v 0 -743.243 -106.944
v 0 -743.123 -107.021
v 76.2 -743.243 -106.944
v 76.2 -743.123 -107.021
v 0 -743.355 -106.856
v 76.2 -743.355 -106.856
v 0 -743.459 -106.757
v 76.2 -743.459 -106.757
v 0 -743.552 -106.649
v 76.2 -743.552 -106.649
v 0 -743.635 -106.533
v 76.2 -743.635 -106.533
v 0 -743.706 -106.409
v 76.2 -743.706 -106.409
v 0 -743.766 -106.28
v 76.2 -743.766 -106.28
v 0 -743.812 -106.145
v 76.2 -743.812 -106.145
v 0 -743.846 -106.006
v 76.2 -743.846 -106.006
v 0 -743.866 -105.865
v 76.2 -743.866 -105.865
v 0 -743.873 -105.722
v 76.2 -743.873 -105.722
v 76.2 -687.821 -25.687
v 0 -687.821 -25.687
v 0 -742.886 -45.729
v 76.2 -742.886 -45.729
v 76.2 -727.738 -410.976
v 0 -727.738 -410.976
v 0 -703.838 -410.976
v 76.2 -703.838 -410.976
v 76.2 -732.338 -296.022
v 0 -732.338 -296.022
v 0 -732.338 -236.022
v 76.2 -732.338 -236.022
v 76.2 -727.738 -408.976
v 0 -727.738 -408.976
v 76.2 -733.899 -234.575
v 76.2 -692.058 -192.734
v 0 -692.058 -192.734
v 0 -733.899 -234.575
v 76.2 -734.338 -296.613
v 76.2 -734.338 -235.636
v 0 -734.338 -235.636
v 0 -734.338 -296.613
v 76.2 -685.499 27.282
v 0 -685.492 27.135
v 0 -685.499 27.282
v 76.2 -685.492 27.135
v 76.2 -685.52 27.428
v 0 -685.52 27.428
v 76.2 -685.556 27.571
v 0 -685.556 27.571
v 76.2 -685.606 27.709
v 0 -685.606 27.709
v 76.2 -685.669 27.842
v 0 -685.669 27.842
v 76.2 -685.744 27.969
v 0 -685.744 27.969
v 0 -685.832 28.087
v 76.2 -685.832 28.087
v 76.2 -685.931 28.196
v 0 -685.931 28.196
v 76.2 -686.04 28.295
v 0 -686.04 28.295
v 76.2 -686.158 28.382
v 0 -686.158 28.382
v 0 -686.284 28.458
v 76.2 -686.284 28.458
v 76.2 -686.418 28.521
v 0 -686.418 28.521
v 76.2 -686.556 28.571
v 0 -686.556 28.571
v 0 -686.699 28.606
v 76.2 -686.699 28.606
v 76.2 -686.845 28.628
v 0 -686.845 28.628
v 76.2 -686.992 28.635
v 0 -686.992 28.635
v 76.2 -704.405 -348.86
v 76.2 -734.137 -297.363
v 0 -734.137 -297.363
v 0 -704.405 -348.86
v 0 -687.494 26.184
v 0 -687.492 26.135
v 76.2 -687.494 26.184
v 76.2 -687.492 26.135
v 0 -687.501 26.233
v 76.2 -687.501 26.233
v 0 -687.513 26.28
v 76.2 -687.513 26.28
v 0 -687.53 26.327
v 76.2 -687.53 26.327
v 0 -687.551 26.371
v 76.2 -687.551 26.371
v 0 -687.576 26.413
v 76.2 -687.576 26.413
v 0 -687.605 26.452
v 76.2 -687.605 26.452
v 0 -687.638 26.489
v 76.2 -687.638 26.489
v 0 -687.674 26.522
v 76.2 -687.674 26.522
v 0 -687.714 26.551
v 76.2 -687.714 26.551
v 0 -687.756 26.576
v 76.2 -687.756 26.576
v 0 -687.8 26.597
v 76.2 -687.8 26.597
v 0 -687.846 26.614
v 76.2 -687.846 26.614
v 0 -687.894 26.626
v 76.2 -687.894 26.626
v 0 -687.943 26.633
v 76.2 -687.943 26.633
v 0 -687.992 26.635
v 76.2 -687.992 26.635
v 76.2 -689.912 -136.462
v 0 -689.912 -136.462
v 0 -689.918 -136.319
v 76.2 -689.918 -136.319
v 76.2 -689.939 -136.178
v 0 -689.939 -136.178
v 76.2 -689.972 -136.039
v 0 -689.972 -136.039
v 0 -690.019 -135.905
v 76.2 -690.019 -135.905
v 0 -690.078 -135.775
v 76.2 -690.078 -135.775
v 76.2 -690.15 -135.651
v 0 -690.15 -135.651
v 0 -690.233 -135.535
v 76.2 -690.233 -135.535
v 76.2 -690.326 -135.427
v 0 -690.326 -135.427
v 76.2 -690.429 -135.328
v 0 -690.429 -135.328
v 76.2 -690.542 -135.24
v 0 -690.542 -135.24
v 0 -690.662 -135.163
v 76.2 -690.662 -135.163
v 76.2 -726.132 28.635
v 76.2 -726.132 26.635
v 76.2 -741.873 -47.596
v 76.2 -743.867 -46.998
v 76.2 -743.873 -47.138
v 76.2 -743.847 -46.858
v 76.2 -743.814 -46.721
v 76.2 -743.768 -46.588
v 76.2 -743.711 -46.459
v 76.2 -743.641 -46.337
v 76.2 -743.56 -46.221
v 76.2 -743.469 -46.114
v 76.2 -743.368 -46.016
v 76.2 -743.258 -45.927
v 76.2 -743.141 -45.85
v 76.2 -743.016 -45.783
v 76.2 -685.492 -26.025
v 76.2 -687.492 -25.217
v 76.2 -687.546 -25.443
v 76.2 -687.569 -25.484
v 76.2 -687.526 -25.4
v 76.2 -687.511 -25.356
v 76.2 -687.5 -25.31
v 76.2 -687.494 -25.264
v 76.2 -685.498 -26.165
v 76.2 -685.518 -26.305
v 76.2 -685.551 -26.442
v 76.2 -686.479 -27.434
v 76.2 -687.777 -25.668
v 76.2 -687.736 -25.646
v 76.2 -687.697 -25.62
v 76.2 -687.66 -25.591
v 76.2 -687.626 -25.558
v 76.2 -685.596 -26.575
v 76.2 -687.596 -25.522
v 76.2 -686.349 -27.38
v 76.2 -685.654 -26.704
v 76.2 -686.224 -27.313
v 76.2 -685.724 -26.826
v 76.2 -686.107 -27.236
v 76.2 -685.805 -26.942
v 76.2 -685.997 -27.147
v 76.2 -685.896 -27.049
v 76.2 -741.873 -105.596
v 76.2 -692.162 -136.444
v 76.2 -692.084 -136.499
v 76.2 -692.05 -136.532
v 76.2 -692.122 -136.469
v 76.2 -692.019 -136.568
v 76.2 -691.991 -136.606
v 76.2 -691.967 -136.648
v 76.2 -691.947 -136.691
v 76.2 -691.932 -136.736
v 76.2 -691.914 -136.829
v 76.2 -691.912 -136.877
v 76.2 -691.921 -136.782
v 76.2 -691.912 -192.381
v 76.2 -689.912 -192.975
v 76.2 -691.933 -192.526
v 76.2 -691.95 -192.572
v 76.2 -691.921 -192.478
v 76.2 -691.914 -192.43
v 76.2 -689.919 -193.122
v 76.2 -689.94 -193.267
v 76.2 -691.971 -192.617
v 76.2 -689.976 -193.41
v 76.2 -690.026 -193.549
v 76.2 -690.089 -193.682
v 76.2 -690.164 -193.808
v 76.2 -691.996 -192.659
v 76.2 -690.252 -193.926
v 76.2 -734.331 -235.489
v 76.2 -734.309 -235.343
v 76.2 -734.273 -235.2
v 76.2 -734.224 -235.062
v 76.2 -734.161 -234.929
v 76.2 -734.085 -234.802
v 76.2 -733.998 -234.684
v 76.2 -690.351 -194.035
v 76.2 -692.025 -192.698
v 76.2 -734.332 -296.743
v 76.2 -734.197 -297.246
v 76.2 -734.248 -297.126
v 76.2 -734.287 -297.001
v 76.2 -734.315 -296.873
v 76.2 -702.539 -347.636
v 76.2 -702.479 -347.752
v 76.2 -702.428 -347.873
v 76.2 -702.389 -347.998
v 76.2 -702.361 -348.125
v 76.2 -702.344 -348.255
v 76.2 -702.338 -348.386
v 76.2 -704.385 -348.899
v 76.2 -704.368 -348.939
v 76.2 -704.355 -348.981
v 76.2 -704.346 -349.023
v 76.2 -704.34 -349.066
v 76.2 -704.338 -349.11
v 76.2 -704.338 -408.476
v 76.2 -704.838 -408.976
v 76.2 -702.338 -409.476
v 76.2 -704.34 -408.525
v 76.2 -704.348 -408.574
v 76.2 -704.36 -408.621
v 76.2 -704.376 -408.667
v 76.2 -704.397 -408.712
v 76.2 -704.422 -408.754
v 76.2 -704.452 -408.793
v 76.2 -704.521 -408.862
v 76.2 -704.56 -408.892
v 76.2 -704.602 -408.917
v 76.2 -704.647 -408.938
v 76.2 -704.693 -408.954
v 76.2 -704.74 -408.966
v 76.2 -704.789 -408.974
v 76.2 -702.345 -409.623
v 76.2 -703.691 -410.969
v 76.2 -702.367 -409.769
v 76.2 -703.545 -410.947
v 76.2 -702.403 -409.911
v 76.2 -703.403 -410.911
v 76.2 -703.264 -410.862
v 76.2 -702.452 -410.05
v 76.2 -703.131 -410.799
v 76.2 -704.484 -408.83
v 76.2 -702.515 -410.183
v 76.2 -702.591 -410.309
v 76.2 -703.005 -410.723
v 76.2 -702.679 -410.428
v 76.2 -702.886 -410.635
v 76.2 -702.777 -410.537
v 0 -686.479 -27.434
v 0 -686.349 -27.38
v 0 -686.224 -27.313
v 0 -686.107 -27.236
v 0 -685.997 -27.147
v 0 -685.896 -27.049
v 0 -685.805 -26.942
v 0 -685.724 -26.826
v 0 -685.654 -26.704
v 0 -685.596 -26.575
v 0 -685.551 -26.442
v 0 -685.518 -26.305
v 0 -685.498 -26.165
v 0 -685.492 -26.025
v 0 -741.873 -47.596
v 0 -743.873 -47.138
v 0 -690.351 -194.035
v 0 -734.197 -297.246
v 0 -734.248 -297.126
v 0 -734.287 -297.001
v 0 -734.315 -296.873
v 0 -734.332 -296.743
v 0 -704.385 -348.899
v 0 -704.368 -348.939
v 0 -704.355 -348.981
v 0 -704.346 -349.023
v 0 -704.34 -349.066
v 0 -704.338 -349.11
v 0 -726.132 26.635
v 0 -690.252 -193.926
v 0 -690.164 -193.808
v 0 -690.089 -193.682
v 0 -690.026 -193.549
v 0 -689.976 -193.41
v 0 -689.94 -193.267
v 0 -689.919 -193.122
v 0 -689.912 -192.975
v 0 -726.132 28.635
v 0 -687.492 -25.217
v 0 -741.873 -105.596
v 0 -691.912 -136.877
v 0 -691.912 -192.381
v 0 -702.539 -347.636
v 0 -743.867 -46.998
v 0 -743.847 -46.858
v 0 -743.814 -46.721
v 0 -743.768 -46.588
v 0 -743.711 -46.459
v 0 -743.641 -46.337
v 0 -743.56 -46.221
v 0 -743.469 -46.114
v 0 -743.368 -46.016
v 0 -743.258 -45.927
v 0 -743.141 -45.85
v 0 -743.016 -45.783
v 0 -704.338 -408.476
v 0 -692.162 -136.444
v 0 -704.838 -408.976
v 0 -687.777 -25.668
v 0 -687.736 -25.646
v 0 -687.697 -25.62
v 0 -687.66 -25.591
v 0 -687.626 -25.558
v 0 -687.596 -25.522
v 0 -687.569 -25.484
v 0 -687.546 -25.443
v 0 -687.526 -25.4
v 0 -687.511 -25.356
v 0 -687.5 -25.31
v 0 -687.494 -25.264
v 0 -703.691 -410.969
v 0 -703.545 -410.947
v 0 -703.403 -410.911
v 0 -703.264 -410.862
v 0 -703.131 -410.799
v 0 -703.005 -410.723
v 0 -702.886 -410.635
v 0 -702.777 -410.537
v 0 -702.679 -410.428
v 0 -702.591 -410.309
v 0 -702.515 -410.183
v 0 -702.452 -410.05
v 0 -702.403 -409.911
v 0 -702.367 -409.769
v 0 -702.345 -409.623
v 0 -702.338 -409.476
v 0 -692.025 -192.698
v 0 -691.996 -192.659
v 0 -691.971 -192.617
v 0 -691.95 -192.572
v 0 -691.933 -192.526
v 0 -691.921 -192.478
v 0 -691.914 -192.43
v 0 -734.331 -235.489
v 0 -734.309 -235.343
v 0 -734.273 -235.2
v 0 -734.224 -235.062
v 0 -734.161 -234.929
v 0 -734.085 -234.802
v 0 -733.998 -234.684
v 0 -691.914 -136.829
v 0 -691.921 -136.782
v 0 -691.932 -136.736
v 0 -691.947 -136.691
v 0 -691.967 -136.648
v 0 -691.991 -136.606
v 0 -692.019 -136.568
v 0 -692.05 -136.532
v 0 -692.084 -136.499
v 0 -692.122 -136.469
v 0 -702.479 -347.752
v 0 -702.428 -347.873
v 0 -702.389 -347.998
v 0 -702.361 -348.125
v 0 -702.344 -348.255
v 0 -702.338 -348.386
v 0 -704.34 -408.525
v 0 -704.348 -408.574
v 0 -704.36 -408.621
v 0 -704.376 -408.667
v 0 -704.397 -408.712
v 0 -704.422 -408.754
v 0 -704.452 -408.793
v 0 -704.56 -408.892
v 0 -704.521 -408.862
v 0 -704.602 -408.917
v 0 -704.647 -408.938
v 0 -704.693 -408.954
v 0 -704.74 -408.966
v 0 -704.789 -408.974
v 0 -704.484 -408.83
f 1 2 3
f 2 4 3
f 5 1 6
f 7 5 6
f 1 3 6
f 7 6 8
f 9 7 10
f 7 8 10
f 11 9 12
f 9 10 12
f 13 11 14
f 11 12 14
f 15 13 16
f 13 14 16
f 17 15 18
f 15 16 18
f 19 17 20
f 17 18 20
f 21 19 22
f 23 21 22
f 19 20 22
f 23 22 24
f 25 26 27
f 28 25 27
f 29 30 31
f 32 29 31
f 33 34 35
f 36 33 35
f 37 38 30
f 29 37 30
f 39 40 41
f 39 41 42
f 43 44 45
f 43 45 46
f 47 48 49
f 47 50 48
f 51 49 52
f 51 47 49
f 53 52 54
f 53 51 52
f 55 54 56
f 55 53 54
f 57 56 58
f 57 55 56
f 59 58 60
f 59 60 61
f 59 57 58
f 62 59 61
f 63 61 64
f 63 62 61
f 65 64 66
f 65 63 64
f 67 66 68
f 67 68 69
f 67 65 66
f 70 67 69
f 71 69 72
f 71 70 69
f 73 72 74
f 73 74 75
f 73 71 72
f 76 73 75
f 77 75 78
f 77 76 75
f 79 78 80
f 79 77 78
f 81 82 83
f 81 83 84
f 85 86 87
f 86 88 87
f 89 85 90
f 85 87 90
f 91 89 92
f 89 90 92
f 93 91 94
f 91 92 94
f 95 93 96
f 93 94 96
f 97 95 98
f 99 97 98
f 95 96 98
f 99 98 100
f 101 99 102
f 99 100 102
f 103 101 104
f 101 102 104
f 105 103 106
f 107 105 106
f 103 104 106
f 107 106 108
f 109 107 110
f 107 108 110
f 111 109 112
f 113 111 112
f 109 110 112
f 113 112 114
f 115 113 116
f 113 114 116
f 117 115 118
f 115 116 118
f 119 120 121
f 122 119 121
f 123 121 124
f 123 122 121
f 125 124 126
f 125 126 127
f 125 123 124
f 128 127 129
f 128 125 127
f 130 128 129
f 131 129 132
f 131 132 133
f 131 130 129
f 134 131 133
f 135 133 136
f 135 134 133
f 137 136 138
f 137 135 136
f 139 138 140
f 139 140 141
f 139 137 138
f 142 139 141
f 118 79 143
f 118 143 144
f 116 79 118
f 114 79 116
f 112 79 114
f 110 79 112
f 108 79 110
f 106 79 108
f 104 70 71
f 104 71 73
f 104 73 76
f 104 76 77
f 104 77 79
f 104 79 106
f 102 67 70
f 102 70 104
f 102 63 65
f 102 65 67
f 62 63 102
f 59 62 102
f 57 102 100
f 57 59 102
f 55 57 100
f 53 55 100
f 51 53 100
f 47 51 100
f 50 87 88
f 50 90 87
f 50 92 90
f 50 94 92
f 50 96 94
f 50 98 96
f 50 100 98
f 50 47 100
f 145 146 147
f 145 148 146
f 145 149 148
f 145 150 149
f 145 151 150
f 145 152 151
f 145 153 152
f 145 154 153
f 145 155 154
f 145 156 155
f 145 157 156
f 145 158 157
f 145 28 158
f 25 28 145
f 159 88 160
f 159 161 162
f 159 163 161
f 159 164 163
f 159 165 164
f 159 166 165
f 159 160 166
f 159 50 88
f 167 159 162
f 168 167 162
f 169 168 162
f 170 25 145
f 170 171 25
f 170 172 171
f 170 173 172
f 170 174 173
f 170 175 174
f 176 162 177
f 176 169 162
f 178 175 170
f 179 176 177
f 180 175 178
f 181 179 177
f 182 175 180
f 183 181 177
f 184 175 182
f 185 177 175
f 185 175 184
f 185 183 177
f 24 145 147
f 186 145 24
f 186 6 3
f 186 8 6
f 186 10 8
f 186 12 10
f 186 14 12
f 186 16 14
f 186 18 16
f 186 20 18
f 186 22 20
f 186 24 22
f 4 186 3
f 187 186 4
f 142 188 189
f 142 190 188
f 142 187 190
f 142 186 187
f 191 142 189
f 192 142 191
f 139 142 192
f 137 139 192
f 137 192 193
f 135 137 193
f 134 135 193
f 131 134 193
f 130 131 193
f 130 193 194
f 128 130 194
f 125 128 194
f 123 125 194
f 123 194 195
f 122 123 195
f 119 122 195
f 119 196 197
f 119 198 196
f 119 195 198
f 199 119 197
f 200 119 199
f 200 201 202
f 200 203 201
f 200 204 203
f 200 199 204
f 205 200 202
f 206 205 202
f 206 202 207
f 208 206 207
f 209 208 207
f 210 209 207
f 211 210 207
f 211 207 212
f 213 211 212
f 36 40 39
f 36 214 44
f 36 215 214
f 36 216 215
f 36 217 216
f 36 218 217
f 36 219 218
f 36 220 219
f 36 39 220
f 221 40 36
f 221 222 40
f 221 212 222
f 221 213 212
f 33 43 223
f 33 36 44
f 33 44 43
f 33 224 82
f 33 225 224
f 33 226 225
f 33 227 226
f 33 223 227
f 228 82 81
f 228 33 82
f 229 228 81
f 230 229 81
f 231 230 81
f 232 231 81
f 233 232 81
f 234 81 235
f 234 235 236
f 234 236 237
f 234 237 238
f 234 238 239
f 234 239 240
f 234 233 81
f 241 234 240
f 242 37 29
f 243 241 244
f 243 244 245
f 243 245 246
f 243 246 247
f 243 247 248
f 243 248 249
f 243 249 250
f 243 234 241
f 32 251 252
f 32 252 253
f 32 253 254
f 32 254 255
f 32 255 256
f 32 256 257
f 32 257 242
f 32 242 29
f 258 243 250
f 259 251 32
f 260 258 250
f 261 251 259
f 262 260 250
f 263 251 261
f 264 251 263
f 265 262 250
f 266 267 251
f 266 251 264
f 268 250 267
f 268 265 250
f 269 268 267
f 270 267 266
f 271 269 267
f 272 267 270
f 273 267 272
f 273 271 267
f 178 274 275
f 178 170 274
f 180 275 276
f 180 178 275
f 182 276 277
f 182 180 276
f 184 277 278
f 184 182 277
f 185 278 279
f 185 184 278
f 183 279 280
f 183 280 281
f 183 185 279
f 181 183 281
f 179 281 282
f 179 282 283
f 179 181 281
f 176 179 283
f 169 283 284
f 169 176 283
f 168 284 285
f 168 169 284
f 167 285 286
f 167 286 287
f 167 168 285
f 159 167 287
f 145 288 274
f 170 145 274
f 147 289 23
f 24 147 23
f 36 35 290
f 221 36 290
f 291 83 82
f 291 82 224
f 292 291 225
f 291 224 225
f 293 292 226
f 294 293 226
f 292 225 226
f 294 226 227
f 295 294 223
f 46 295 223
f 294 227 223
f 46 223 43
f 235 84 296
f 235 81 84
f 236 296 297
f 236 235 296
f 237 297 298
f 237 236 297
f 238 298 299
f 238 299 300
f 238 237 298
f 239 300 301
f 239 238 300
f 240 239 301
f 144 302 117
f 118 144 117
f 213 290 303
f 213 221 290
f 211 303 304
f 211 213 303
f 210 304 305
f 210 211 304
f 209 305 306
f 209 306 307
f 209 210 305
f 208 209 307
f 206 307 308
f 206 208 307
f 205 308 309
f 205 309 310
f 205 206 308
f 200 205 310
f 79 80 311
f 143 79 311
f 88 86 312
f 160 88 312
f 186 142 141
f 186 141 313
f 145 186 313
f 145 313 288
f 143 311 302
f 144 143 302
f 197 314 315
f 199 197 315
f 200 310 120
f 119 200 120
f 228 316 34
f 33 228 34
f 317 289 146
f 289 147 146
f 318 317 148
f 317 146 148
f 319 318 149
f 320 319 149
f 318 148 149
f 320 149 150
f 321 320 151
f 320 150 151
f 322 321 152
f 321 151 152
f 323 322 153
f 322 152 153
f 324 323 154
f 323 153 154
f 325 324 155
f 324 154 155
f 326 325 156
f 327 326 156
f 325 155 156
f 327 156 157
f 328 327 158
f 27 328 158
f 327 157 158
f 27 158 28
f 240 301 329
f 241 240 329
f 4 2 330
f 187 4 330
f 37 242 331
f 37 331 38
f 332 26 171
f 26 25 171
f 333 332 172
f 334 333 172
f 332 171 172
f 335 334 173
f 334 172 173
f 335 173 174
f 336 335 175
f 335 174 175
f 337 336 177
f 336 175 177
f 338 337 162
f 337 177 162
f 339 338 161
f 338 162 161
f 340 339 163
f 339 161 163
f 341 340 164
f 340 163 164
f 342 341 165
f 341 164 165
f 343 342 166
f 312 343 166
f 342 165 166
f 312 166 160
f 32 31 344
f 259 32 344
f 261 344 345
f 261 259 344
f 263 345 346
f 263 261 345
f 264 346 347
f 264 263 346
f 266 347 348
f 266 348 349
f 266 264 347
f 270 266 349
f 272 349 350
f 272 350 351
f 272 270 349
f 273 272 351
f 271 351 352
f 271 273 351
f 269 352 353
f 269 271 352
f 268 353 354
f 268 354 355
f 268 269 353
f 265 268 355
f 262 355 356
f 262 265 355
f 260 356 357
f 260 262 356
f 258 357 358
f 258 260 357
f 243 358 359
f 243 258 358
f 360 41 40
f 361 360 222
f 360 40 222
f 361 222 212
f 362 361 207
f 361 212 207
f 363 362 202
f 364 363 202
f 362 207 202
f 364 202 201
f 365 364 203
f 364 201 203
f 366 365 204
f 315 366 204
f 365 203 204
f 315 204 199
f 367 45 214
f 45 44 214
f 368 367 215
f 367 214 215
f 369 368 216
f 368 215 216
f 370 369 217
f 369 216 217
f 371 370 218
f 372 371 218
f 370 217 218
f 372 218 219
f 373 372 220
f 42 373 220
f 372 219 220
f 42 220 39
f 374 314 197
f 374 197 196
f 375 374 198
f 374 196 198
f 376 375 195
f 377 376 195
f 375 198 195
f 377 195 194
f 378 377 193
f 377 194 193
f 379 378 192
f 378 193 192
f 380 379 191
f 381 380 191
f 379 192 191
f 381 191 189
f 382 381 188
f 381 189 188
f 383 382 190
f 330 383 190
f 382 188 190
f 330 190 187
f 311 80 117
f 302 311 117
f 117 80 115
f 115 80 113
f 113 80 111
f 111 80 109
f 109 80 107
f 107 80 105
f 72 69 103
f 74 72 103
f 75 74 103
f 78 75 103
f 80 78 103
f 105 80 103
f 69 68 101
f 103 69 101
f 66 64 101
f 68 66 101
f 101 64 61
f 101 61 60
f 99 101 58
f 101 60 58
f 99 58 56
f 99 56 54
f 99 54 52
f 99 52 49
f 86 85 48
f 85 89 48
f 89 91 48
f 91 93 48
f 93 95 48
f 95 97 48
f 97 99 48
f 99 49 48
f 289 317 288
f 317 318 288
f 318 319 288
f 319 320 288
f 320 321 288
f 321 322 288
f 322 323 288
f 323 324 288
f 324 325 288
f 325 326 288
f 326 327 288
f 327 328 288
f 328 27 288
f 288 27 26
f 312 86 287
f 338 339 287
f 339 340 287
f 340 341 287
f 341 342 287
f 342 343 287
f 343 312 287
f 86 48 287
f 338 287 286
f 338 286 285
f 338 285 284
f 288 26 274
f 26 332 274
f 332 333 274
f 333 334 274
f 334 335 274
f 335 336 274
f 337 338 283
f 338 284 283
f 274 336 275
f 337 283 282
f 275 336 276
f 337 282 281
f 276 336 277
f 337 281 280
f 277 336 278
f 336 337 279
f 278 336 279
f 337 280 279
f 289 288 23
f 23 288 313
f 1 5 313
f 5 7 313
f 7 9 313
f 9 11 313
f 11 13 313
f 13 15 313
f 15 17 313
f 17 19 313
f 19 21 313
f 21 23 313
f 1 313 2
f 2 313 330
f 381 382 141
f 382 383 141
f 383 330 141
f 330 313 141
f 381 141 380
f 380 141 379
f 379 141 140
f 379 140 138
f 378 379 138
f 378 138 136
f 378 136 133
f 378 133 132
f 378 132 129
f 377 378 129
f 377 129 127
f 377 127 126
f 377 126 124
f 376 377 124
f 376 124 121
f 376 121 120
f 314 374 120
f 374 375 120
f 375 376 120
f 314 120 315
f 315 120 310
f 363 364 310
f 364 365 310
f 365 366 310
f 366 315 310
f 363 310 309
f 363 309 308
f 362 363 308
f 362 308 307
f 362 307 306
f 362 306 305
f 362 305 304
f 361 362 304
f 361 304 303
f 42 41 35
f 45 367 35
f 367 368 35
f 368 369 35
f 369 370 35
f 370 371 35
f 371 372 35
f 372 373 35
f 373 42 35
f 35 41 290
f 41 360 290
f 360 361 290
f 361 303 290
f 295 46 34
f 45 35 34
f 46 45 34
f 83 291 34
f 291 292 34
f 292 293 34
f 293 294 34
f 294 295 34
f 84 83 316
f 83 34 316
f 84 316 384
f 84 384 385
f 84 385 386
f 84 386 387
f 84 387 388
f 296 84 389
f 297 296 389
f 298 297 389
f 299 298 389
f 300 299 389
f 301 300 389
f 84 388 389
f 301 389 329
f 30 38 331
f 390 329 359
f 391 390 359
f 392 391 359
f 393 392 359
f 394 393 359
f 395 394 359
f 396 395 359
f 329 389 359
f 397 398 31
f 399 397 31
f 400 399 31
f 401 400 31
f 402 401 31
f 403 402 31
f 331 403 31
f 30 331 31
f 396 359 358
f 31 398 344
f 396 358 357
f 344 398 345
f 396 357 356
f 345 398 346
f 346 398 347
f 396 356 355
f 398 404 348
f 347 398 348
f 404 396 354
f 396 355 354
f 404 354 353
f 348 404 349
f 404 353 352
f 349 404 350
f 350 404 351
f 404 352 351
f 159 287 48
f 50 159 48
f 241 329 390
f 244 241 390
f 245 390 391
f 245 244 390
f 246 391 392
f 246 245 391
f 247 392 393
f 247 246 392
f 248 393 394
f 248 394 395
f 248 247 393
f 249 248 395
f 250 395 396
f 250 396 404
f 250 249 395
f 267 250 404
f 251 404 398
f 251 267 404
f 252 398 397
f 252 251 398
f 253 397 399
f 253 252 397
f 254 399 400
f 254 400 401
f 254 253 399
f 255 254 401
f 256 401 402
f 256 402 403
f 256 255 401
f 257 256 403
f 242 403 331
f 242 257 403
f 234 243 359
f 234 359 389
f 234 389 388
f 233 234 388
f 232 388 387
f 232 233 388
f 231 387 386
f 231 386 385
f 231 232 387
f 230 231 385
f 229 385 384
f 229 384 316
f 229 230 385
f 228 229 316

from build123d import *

# Parameters (mm, degrees)
BOSS_EXTRUDE1_DEPTH = 76.2
FILLET1_R           = 1.5
FILLET2_R           = 1.5
FILLET3_R           = 0.5


with BuildPart() as part:
    # Sketch1 → Boss-Extrude1 (new body)
    with BuildSketch(Plane(origin=(0, 0, 0), x_dir=(0, 0, -1), z_dir=(1, 0, 0))):
        Polygon((410.975974775, -727.738016425), (410.975974775, -702.338016425), (347.983974775, -702.338016425), (296.022450548, -732.338016425), (236.022450548, -732.338016425), (193.596043677, -689.911609554), (135.596043677, -689.911609554), (105.596043677, -741.873133781), (47.596043677, -741.873133781), (27.074835078, -685.491576534), (-28.635164922, -685.491576534), (-28.635164922, -726.131576534), (-26.635164922, -726.131576534), (-26.635164922, -687.491576534), (25.566835078, -687.491576534), (46.088043677, -743.873133781), (106.588043677, -743.873133781), (136.588043677, -691.911609554), (192.588043677, -691.911609554), (235.014450548, -734.338016425), (297.014450548, -734.338016425), (348.975974775, -704.338016425), (408.975974775, -704.338016425), (408.975974775, -727.738016425), align=None)
    extrude(amount=BOSS_EXTRUDE1_DEPTH)

    # Fillet1
    fillet1_edges = [part.edges().sort_by_distance(p)[0] for p in [
        (38.1, -685.491576534, 28.635164922),
        (38.1, -685.491576534, -27.074835078),
        (38.1, -689.911609554, -135.596043677),
        (38.1, -689.911609554, -193.596043677),
        (38.1, -702.338016425, -347.983974775),
        (38.1, -702.338016425, -410.975974775),
    ]]
    fillet(fillet1_edges, radius=FILLET1_R)

    # Fillet2
    fillet2_edges = [part.edges().sort_by_distance(p)[0] for p in [
        (38.1, -734.338016425, -297.014450548),
        (38.1, -734.338016425, -235.014450548),
        (38.1, -743.873133781, -106.588043677),
        (38.1, -743.873133781, -46.088043677),
    ]]
    fillet(fillet2_edges, radius=FILLET2_R)

    # Fillet3
    fillet3_edges = [part.edges().sort_by_distance(p)[0] for p in [
        (38.1, -704.338016425, -408.975974775),
        (38.1, -704.338016425, -348.975974775),
        (38.1, -691.911609554, -192.588043677),
        (38.1, -691.911609554, -136.588043677),
        (38.1, -687.491576534, -25.566835078),
        (38.1, -687.491576534, 26.635164922),
    ]]
    fillet(fillet3_edges, radius=FILLET3_R)


solid = part.part
